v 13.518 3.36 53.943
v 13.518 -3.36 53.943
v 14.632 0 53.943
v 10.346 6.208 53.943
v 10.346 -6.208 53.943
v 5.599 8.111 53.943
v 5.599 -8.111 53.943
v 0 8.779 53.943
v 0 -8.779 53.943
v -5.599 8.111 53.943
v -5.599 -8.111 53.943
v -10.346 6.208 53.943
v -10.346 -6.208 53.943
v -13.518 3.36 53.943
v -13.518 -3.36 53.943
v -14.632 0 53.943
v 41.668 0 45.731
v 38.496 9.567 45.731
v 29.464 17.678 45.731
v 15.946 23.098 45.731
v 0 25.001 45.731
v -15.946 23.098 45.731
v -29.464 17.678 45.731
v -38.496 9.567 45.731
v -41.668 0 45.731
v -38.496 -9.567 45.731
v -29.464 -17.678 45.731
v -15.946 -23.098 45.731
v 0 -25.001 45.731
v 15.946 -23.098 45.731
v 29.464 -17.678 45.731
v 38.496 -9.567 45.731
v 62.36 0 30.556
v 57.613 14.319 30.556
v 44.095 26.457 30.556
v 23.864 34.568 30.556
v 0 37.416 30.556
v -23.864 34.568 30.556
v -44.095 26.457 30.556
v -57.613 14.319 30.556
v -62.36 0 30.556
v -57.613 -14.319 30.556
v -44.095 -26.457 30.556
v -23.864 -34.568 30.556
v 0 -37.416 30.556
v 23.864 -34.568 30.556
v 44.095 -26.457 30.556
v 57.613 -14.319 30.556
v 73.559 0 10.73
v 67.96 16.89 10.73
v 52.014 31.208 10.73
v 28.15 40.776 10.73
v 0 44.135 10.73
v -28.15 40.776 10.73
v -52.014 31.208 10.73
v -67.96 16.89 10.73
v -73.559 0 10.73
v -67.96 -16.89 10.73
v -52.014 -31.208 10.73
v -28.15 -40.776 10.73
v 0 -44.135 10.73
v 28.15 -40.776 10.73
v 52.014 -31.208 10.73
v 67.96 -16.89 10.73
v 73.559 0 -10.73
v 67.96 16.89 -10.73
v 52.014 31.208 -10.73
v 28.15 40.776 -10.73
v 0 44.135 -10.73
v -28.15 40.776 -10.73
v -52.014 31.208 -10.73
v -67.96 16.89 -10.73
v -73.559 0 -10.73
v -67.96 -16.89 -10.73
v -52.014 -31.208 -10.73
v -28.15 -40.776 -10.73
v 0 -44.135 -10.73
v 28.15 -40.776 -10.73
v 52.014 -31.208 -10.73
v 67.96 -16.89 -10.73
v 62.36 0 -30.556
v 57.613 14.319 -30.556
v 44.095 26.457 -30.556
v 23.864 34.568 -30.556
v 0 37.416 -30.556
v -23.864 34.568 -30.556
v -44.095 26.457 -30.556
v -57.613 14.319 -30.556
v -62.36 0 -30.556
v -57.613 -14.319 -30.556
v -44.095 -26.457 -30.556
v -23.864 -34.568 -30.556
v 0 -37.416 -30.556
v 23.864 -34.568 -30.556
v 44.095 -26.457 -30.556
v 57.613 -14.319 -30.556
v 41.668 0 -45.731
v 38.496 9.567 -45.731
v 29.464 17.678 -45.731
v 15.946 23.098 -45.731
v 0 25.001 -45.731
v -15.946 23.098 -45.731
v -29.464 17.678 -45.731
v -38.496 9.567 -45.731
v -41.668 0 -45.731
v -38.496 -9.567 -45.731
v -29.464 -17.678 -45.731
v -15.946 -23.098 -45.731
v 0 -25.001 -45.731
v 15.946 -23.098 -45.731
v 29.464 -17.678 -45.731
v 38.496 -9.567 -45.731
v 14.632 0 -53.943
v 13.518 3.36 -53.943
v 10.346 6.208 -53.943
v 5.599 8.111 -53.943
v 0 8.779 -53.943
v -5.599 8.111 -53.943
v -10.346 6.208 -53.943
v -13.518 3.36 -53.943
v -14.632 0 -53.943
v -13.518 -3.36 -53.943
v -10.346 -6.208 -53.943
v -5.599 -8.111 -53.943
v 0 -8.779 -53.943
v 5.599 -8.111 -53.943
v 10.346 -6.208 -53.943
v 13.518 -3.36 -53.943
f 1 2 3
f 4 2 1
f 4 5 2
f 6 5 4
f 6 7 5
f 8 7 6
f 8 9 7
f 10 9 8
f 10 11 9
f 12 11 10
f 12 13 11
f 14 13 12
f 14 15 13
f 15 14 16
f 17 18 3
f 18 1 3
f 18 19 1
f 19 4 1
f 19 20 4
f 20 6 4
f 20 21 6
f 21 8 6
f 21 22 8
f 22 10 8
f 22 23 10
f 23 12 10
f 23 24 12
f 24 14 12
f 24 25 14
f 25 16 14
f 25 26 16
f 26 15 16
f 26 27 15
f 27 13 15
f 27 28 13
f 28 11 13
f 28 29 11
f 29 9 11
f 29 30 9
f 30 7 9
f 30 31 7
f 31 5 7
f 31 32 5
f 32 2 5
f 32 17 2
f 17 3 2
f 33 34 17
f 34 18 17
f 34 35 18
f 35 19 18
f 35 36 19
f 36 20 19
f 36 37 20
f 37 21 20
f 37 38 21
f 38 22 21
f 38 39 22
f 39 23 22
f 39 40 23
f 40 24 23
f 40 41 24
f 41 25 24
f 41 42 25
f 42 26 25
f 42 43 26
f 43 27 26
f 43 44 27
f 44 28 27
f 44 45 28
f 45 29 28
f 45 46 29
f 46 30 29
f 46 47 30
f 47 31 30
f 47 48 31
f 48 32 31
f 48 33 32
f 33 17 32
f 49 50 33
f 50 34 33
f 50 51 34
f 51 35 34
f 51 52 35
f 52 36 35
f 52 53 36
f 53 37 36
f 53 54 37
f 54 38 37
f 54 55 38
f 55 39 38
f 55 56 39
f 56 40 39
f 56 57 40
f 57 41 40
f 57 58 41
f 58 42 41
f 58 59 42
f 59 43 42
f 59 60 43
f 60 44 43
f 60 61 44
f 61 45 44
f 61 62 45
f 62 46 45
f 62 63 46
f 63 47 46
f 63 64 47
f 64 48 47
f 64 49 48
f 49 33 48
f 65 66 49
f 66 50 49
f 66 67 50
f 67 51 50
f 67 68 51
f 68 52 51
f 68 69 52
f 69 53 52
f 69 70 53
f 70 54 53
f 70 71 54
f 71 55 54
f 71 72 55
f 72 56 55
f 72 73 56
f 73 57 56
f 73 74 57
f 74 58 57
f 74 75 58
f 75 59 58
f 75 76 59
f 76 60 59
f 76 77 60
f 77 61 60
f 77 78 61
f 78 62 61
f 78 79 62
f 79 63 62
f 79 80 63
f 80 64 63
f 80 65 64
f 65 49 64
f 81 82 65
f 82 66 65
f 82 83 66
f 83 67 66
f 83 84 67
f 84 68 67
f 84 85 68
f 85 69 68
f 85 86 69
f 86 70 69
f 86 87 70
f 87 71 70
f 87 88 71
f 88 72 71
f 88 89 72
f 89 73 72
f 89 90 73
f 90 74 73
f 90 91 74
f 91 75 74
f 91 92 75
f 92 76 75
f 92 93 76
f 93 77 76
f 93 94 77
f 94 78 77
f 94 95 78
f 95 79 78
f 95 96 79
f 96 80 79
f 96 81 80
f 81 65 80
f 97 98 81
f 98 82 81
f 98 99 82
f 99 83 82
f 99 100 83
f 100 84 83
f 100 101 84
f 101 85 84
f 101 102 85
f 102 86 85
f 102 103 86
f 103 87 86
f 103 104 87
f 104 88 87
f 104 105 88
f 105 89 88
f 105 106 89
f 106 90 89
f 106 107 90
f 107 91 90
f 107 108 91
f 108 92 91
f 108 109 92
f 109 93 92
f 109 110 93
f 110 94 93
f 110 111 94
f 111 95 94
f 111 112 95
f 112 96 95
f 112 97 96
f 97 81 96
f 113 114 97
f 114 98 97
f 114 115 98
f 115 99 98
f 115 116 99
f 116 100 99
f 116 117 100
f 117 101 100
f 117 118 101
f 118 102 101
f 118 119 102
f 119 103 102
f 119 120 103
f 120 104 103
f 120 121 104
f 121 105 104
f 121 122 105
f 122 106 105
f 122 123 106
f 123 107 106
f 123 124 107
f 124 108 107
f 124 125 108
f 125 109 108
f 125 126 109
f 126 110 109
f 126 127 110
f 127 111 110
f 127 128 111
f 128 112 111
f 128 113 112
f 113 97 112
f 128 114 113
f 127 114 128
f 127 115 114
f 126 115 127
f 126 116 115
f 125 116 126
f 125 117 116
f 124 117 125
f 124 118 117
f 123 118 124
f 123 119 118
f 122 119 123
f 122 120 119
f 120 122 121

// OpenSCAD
// Generated by SolidPython 1.0.1 on 2020-07-29 00:46:52


scale(v = [15, 9, 11]) {
	sphere(r = 5);
}
/***********************************************
*********      SolidPython code:      **********
************************************************
 
# import packages: SolidPython
from solid import *
from solid.utils import *
from itertools import chain, combinations, permutations


class Resize:

    def __init__(self, scad_file):
        self.scad_file = scad_file
        #self.scad_file = import_scad(scad_file)
        # cone/cylinder param:
        self.r1 = 0
        self.r2 = 0
        self.h = 0
        # rectangular prism param:
        self.w = 0
        self.l = 0
        # ellipse param:
        self.r = 0

    # import OpenScad code (file name corresponds to shape)


    # classify shape + parameters
    def assign(self, param1, param2, param3):
        if self.scad_file == 'cone.scad':
            self.r1 = param1
            self.r2 = param2
            self.h = param3
        elif self.scad_file == 'cylinder.scad':
            self.r1 = param1
            self.r2 = param2
            self.h = param3
        elif self.scad_file == 'rectangularPrism.scad':
            self.h = param1
            self.l = param2
            self.w = param3
        else:
            self.r = param1
            self.h = param2

    # resize parameters
    def iterate(self):
        x = range(3, 20, 2)
        i = 1
        if self.scad_file == 'cone.scad':
            tempList = list(permutations(x, 2))
            for temp in tempList:
                param1 = temp[0]
                param2 = temp[1]
                filepath = 'produced_scad_files/' + 'cone' + str(param1) + '_' + str(param2) + '_' + '.scad'
                scad_render_to_file(cylinder(h=param1, r1=param2, r2=0), filepath)

        elif self.scad_file == 'cylinder.scad':
            tempList = list(permutations(x, 3))
            for temp in tempList:
                param1 = temp[0]
                param2 = temp[1]
                filepath = 'produced_scad_files/' + 'cylinder' + str(param1) + '_' + str(param2) + '_' + '.scad'
                scad_render_to_file(cylinder(h=param1, r1=param2, r2=param2), filepath)

        elif self.scad_file == 'rectangularPrism.scad':
            tempList = list(permutations(x, 3))
            for temp in tempList:
                param1 = temp[0]
                param2 = temp[1]
                param3 = temp[2]
                filepath = 'produced_scad_files/' + 'rectangularPrism' + str(param1) + '_' + str(param2) + '_' + str(
                    param3) + '.scad'
                scad_render_to_file(cube(size=(param1, param2, param3)), filepath)

        elif self.scad_file == 'ellipse.scad':
            tempList = list(permutations(x, 4))
            for temp in tempList:
                param1 = temp[0]
                param2 = temp[1]
                param3 = temp[2]
                param4 = temp[3]
                filepath = 'produced_scad_files/' + 'ellipse' + str(param1) + '_' + str(param2) + '_' + str(param3) + '_' + str(param4) + '.scad'
                scad_render_to_file(scale([param1, param2, param3])(sphere(r=param4)), filepath)

    def render_to_scadfile(self):
        scad_render_to_file(scad, 'example.scad') 
 
************************************************/
